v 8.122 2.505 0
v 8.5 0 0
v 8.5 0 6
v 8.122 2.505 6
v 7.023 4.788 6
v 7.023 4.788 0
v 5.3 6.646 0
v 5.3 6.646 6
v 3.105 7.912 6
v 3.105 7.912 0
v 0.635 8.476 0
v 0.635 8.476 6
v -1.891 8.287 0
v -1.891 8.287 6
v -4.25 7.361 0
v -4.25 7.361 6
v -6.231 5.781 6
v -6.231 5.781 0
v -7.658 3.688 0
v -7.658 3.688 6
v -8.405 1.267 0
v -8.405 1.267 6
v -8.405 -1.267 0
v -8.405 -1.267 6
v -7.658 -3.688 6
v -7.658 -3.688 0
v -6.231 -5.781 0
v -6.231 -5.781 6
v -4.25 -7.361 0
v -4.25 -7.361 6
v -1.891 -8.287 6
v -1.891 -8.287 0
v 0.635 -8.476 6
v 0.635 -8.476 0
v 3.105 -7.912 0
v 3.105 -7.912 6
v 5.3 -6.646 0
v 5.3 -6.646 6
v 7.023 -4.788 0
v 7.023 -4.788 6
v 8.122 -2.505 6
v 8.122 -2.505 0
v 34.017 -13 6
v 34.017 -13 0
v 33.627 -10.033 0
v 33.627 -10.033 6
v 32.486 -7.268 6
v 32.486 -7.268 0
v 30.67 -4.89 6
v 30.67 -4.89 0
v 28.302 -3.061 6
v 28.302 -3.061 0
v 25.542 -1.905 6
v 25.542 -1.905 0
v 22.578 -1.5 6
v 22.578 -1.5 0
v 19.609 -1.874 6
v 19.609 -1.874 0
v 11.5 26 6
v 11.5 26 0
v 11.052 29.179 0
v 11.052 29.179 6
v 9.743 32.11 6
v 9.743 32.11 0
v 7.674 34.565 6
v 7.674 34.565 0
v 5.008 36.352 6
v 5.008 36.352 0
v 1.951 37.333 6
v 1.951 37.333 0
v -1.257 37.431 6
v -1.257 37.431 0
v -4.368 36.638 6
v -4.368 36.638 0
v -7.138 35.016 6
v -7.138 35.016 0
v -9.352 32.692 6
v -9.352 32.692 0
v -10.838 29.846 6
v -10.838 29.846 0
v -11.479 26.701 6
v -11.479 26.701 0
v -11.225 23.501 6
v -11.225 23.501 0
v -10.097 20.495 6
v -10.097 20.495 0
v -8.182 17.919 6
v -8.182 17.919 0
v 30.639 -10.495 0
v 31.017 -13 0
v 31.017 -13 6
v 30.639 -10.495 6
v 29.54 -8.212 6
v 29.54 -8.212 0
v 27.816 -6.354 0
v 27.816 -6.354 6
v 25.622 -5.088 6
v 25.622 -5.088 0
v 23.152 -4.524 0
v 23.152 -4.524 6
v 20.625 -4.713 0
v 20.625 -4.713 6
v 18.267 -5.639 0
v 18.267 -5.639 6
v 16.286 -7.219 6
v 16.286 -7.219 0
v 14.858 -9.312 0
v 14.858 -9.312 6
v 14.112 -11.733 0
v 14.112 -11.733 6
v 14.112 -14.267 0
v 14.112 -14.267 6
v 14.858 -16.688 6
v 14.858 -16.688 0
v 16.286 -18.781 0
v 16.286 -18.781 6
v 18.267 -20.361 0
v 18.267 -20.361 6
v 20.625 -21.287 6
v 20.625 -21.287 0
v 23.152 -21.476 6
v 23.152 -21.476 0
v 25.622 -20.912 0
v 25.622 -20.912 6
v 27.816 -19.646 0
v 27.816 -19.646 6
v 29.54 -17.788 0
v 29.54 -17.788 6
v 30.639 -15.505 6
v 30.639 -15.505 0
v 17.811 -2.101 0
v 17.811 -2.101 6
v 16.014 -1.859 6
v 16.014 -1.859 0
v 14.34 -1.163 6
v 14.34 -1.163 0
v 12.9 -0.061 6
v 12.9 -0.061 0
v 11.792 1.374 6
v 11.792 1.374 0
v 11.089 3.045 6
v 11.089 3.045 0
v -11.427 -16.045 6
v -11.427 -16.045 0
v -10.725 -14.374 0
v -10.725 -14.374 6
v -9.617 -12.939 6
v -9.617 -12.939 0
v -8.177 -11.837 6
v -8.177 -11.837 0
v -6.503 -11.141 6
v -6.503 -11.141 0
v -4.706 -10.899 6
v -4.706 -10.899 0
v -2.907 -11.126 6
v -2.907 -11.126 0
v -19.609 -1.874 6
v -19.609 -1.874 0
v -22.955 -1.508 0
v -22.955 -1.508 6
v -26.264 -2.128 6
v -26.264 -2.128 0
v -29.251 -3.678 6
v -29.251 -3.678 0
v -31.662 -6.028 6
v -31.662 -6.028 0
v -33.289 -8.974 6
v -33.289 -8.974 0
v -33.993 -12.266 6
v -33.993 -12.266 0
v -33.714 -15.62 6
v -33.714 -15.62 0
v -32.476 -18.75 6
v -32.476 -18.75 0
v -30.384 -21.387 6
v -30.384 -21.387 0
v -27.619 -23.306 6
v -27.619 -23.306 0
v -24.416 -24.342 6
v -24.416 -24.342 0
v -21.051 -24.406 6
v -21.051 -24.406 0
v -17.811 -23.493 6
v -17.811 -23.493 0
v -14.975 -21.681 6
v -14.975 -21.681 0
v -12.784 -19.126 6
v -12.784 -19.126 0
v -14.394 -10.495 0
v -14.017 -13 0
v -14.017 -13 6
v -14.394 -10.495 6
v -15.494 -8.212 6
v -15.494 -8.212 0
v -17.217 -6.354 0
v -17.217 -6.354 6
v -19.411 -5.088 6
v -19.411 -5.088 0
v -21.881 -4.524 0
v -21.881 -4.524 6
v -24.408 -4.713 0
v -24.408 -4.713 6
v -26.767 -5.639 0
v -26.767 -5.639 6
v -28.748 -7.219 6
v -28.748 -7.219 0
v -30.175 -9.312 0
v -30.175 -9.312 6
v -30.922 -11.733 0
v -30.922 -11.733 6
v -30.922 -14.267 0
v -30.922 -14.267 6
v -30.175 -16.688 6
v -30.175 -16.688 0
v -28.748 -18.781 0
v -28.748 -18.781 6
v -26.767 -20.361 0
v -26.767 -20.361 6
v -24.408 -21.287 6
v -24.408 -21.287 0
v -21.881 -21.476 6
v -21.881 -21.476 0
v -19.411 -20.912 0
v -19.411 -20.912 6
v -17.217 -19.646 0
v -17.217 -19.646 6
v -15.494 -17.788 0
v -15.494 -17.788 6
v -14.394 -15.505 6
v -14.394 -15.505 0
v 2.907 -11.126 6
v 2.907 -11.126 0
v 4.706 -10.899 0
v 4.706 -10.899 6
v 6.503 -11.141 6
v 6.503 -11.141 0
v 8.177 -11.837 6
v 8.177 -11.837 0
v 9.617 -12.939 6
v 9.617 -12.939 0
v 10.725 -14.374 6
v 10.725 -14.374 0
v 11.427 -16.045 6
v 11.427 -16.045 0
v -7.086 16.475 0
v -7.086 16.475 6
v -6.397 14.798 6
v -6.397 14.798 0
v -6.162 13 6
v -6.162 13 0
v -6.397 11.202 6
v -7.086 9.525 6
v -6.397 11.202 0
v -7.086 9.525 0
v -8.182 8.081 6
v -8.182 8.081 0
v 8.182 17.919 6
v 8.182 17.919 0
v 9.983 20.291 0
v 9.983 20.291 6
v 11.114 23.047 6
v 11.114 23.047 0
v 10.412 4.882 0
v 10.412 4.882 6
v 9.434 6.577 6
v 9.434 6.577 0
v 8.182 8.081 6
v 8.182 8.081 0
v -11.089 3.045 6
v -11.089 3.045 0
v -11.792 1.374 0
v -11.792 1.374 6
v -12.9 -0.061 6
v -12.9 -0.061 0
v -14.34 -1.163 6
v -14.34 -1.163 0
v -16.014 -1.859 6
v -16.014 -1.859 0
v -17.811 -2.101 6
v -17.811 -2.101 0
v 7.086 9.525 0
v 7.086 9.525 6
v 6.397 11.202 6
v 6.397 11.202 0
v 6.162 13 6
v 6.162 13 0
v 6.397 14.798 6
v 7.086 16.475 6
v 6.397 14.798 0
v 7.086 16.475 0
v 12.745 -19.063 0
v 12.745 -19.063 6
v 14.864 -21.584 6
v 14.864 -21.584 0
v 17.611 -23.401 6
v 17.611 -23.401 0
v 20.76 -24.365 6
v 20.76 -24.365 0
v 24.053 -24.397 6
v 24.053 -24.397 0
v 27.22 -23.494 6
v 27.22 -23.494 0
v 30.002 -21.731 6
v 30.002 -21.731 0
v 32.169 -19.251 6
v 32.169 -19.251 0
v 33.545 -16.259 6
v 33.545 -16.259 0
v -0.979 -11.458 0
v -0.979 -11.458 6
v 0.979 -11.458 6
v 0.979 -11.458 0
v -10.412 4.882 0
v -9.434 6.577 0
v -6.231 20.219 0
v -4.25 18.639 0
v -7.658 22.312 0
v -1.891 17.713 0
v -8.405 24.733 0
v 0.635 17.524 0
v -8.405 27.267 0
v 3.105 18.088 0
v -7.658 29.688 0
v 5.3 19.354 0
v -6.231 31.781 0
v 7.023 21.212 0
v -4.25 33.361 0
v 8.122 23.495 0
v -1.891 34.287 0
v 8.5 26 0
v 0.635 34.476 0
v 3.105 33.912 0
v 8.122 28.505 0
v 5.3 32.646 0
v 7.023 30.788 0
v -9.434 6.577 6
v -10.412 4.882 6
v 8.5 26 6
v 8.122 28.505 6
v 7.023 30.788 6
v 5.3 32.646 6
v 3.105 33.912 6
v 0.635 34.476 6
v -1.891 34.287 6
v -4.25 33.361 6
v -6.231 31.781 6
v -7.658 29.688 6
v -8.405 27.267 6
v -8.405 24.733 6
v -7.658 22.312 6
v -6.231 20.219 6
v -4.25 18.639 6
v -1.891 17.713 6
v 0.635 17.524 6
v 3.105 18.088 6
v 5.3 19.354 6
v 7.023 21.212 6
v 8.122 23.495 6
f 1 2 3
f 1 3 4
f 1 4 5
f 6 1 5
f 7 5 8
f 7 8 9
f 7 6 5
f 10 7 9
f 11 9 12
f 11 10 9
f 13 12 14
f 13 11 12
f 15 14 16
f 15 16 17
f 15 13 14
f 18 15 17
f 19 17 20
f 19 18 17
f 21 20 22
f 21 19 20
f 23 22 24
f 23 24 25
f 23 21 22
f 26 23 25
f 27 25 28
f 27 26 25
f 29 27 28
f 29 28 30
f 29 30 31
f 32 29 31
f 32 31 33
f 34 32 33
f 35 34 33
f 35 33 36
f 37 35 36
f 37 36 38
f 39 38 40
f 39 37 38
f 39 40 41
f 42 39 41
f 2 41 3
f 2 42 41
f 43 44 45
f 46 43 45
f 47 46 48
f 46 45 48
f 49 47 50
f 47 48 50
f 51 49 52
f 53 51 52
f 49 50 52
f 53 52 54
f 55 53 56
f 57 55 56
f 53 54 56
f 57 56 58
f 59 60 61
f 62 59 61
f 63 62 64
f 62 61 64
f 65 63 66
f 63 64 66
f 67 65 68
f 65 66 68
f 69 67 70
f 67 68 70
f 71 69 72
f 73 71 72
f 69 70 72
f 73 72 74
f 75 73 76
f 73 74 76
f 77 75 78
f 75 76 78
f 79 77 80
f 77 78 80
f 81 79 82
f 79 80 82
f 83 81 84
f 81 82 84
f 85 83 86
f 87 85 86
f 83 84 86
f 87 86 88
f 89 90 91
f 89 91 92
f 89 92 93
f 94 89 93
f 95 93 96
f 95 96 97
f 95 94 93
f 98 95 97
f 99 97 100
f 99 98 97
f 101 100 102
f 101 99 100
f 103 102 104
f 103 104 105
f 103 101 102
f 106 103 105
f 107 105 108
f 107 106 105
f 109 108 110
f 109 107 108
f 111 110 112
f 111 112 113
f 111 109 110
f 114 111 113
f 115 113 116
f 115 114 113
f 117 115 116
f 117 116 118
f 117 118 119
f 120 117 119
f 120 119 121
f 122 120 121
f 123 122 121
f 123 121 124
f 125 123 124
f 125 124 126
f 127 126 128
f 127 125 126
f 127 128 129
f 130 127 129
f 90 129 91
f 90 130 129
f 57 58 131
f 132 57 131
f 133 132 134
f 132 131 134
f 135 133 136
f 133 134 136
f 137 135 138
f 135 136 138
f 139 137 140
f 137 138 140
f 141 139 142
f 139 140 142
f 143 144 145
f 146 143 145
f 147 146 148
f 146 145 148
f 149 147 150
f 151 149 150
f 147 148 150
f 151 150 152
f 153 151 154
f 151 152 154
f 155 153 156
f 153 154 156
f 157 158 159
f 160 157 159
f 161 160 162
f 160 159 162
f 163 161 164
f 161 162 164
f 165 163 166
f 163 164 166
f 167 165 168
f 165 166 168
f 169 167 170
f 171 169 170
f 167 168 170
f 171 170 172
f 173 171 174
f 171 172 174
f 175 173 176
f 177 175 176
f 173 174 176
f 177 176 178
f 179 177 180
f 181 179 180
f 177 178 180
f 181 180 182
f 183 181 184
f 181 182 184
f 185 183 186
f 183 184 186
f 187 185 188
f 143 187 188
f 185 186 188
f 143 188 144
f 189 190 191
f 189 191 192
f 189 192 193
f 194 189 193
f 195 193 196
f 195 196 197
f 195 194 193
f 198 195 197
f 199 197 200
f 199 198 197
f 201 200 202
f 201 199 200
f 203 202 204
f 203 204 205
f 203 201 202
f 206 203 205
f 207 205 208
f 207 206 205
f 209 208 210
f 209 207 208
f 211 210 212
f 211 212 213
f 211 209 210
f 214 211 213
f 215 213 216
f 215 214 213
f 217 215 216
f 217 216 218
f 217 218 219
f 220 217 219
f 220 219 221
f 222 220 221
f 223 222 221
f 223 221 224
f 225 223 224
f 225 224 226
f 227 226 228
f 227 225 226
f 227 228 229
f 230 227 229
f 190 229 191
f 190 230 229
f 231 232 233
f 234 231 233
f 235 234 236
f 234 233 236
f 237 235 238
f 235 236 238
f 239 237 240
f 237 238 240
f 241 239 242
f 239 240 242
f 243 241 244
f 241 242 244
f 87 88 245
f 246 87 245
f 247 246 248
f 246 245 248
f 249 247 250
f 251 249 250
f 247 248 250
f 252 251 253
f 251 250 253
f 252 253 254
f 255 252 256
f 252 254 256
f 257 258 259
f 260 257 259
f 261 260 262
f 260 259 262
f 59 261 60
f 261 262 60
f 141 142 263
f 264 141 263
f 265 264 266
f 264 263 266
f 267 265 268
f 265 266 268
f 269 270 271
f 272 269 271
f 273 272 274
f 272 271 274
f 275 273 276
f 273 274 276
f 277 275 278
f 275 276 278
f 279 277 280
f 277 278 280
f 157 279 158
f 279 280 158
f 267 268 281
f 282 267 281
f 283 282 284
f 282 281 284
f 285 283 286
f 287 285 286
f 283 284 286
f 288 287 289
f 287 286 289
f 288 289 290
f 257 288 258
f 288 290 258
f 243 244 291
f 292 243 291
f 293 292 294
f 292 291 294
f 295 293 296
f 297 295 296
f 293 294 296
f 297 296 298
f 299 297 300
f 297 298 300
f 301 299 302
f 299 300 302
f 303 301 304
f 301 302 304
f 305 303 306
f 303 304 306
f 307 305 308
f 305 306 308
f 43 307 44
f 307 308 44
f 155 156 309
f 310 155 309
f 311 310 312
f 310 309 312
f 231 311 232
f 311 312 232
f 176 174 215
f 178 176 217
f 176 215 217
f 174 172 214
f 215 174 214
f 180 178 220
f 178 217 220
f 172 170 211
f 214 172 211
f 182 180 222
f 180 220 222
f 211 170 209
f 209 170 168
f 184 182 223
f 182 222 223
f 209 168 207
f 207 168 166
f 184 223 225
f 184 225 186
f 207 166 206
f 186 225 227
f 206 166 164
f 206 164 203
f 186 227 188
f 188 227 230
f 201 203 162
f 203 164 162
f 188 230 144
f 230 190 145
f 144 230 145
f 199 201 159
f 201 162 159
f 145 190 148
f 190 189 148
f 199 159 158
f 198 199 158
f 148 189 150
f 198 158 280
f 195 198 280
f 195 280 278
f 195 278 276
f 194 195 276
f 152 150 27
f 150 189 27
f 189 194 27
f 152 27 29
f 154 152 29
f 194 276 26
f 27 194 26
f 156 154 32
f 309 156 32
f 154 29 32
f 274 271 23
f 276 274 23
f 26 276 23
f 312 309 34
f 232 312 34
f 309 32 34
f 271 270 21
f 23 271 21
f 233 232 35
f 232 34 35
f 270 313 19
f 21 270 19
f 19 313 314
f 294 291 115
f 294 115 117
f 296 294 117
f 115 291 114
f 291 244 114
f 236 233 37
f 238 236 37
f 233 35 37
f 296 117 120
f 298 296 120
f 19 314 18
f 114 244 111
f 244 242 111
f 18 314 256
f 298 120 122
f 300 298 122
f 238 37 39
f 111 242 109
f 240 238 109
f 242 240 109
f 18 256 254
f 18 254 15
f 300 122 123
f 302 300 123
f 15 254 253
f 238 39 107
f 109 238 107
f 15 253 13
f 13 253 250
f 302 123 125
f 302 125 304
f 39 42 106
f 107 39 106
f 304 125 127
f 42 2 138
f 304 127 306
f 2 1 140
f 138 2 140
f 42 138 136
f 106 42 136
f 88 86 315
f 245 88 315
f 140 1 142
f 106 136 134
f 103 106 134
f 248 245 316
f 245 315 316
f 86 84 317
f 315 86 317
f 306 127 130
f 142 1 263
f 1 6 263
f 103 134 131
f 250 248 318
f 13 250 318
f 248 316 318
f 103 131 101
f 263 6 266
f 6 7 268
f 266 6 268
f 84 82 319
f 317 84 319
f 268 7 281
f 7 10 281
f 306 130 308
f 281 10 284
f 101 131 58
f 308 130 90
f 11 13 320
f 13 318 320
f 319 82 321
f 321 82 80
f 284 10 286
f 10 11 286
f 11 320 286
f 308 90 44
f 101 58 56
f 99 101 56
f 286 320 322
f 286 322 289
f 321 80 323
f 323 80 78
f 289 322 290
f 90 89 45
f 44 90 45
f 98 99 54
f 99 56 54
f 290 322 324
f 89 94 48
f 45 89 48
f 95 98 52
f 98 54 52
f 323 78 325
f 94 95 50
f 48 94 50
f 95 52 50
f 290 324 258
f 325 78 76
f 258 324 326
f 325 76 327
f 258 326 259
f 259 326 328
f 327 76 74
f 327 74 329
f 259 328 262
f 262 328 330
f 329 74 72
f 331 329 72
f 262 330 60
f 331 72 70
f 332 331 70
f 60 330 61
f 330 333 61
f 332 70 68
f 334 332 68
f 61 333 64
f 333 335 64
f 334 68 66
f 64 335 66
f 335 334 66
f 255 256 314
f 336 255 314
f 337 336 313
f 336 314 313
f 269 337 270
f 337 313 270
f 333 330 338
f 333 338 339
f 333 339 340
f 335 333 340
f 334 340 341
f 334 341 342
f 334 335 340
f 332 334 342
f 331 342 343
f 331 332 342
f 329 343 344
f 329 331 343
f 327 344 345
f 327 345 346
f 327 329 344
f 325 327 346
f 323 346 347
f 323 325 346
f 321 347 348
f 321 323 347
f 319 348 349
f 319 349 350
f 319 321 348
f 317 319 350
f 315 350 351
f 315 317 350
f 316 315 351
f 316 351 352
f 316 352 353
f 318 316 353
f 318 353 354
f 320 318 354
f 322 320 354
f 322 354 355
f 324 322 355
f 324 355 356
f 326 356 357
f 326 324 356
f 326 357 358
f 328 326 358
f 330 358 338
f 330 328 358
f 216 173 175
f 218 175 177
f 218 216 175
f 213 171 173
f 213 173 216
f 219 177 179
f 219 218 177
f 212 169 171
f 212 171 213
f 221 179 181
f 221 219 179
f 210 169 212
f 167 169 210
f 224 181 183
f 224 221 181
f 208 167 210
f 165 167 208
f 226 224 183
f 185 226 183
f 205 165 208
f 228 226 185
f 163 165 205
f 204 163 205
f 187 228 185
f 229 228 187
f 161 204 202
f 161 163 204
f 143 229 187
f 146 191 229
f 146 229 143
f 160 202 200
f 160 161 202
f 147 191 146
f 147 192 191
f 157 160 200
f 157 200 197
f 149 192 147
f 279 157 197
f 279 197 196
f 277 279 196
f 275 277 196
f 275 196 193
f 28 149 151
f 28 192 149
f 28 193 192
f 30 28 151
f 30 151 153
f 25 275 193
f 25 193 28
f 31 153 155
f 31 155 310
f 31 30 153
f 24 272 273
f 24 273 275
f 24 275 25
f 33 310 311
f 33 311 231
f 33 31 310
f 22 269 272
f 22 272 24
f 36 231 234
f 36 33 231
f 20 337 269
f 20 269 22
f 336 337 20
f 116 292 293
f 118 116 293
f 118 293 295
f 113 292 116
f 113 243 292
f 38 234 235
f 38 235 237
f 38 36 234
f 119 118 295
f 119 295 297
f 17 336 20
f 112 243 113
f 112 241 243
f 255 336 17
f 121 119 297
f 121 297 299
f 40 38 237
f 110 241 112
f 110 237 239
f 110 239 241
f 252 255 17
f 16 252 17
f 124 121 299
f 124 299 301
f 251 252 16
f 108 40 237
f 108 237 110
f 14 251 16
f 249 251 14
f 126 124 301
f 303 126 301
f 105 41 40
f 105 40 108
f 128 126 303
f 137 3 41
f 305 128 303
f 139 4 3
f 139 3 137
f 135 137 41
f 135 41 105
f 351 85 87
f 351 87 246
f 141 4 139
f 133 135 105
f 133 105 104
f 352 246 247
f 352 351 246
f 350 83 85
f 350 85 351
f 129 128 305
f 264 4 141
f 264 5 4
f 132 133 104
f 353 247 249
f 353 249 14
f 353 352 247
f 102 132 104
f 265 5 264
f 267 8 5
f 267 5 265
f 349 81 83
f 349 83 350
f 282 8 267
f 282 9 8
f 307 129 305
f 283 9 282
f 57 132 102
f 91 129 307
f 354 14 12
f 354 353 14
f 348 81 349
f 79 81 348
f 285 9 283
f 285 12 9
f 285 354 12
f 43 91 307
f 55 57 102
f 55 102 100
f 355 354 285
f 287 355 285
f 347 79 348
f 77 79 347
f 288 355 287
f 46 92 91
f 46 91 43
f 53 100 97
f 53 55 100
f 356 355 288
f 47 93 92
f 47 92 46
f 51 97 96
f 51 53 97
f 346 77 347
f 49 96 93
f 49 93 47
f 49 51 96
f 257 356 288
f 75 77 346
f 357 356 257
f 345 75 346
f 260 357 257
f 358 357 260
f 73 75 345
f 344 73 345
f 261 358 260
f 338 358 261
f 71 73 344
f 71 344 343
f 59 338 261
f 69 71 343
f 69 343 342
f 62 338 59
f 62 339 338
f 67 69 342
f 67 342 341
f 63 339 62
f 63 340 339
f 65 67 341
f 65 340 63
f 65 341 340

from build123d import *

# Parameters (mm, degrees)
F0_R     = 8.5
F1_DEPTH = 6


with BuildPart() as f1:
    # F0 (on Top) → F1 (new body)
    with BuildSketch(Plane.XY):
        with BuildLine():
            ThreePointArc((8.182061, 17.918919), (10.638226, 21.632146), (11.5, 26))
            ThreePointArc((11.5, 26), (-4.367854, 36.638226), (-8.182061, 17.918919))
            ThreePointArc((-8.182061, 17.918919), (0, 14.5), (8.182061, 17.918919))
        make_face()
        with Locations((0, 26)):
            Circle(F0_R, mode=Mode.SUBTRACT)
        with BuildLine():
            ThreePointArc((8.182061, 17.918919), (0, 14.5), (-8.182061, 17.918919))
            ThreePointArc((-8.182061, 17.918919), (-6.162447, 13), (-8.182061, 8.081081))
            ThreePointArc((-8.182061, 8.081081), (0, 11.5), (8.182061, 8.081081))
            ThreePointArc((8.182061, 8.081081), (6.162447, 13), (8.182061, 17.918919))
        make_face()
        with BuildLine():
            ThreePointArc((8.182061, 8.081081), (0, 11.5), (-8.182061, 8.081081))
            ThreePointArc((-8.182061, 8.081081), (-9.959292, 5.75), (-11.089452, 3.045332))
            ThreePointArc((-11.089452, 3.045332), (-9.959292, -5.75), (-2.907391, -11.126414))
            ThreePointArc((-2.907391, -11.126414), (0, -11.5), (2.907391, -11.126414))
            ThreePointArc((2.907391, -11.126414), (9.101785, -7.029047), (11.5, 0))
            ThreePointArc((11.5, 0), (11.396901, 1.536441), (11.089452, 3.045332))
            ThreePointArc((11.089452, 3.045332), (9.959292, 5.75), (8.182061, 8.081081))
        make_face()
        Circle(F0_R, mode=Mode.SUBTRACT)
        with BuildLine():
            ThreePointArc((-2.907391, -11.126414), (-9.959292, -5.75), (-11.089452, 3.045332))
            ThreePointArc((-11.089452, 3.045332), (-14.339554, -1.163165), (-19.60927, -1.873586))
            ThreePointArc((-19.60927, -1.873586), (-13.414875, -5.970953), (-11.01666, -13))
            ThreePointArc((-11.01666, -13), (-11.11976, -14.536441), (-11.427208, -16.045332))
            ThreePointArc((-11.427208, -16.045332), (-8.177107, -11.836835), (-2.907391, -11.126414))
        make_face()
        with BuildLine():
            ThreePointArc((-11.01666, -13), (-13.414875, -5.970953), (-19.60927, -1.873586))
            ThreePointArc((-19.60927, -1.873586), (-32.475953, -18.75), (-11.427208, -16.045332))
            ThreePointArc((-11.427208, -16.045332), (-11.11976, -14.536441), (-11.01666, -13))
        make_face()
        with Locations((-22.51666, -13)):
            Circle(F0_R, mode=Mode.SUBTRACT)
        with BuildLine():
            ThreePointArc((19.60927, -1.873586), (14.339554, -1.163165), (11.089452, 3.045332))
            ThreePointArc((11.089452, 3.045332), (11.396901, 1.536441), (11.5, 0))
            ThreePointArc((11.5, 0), (9.101785, -7.029047), (2.907391, -11.126414))
            ThreePointArc((2.907391, -11.126414), (8.177107, -11.836835), (11.427208, -16.045332))
            ThreePointArc((11.427208, -16.045332), (12.557368, -7.25), (19.60927, -1.873586))
        make_face()
        with BuildLine():
            ThreePointArc((34.01666, -13), (29.545708, -3.898215), (19.60927, -1.873586))
            ThreePointArc((19.60927, -1.873586), (12.557368, -7.25), (11.427208, -16.045332))
            ThreePointArc((11.427208, -16.045332), (24.053101, -24.396901), (34.01666, -13))
        make_face()
        with Locations((22.51666, -13)):
            Circle(F0_R, mode=Mode.SUBTRACT)
    extrude(amount=F1_DEPTH)


solid = f1.part
